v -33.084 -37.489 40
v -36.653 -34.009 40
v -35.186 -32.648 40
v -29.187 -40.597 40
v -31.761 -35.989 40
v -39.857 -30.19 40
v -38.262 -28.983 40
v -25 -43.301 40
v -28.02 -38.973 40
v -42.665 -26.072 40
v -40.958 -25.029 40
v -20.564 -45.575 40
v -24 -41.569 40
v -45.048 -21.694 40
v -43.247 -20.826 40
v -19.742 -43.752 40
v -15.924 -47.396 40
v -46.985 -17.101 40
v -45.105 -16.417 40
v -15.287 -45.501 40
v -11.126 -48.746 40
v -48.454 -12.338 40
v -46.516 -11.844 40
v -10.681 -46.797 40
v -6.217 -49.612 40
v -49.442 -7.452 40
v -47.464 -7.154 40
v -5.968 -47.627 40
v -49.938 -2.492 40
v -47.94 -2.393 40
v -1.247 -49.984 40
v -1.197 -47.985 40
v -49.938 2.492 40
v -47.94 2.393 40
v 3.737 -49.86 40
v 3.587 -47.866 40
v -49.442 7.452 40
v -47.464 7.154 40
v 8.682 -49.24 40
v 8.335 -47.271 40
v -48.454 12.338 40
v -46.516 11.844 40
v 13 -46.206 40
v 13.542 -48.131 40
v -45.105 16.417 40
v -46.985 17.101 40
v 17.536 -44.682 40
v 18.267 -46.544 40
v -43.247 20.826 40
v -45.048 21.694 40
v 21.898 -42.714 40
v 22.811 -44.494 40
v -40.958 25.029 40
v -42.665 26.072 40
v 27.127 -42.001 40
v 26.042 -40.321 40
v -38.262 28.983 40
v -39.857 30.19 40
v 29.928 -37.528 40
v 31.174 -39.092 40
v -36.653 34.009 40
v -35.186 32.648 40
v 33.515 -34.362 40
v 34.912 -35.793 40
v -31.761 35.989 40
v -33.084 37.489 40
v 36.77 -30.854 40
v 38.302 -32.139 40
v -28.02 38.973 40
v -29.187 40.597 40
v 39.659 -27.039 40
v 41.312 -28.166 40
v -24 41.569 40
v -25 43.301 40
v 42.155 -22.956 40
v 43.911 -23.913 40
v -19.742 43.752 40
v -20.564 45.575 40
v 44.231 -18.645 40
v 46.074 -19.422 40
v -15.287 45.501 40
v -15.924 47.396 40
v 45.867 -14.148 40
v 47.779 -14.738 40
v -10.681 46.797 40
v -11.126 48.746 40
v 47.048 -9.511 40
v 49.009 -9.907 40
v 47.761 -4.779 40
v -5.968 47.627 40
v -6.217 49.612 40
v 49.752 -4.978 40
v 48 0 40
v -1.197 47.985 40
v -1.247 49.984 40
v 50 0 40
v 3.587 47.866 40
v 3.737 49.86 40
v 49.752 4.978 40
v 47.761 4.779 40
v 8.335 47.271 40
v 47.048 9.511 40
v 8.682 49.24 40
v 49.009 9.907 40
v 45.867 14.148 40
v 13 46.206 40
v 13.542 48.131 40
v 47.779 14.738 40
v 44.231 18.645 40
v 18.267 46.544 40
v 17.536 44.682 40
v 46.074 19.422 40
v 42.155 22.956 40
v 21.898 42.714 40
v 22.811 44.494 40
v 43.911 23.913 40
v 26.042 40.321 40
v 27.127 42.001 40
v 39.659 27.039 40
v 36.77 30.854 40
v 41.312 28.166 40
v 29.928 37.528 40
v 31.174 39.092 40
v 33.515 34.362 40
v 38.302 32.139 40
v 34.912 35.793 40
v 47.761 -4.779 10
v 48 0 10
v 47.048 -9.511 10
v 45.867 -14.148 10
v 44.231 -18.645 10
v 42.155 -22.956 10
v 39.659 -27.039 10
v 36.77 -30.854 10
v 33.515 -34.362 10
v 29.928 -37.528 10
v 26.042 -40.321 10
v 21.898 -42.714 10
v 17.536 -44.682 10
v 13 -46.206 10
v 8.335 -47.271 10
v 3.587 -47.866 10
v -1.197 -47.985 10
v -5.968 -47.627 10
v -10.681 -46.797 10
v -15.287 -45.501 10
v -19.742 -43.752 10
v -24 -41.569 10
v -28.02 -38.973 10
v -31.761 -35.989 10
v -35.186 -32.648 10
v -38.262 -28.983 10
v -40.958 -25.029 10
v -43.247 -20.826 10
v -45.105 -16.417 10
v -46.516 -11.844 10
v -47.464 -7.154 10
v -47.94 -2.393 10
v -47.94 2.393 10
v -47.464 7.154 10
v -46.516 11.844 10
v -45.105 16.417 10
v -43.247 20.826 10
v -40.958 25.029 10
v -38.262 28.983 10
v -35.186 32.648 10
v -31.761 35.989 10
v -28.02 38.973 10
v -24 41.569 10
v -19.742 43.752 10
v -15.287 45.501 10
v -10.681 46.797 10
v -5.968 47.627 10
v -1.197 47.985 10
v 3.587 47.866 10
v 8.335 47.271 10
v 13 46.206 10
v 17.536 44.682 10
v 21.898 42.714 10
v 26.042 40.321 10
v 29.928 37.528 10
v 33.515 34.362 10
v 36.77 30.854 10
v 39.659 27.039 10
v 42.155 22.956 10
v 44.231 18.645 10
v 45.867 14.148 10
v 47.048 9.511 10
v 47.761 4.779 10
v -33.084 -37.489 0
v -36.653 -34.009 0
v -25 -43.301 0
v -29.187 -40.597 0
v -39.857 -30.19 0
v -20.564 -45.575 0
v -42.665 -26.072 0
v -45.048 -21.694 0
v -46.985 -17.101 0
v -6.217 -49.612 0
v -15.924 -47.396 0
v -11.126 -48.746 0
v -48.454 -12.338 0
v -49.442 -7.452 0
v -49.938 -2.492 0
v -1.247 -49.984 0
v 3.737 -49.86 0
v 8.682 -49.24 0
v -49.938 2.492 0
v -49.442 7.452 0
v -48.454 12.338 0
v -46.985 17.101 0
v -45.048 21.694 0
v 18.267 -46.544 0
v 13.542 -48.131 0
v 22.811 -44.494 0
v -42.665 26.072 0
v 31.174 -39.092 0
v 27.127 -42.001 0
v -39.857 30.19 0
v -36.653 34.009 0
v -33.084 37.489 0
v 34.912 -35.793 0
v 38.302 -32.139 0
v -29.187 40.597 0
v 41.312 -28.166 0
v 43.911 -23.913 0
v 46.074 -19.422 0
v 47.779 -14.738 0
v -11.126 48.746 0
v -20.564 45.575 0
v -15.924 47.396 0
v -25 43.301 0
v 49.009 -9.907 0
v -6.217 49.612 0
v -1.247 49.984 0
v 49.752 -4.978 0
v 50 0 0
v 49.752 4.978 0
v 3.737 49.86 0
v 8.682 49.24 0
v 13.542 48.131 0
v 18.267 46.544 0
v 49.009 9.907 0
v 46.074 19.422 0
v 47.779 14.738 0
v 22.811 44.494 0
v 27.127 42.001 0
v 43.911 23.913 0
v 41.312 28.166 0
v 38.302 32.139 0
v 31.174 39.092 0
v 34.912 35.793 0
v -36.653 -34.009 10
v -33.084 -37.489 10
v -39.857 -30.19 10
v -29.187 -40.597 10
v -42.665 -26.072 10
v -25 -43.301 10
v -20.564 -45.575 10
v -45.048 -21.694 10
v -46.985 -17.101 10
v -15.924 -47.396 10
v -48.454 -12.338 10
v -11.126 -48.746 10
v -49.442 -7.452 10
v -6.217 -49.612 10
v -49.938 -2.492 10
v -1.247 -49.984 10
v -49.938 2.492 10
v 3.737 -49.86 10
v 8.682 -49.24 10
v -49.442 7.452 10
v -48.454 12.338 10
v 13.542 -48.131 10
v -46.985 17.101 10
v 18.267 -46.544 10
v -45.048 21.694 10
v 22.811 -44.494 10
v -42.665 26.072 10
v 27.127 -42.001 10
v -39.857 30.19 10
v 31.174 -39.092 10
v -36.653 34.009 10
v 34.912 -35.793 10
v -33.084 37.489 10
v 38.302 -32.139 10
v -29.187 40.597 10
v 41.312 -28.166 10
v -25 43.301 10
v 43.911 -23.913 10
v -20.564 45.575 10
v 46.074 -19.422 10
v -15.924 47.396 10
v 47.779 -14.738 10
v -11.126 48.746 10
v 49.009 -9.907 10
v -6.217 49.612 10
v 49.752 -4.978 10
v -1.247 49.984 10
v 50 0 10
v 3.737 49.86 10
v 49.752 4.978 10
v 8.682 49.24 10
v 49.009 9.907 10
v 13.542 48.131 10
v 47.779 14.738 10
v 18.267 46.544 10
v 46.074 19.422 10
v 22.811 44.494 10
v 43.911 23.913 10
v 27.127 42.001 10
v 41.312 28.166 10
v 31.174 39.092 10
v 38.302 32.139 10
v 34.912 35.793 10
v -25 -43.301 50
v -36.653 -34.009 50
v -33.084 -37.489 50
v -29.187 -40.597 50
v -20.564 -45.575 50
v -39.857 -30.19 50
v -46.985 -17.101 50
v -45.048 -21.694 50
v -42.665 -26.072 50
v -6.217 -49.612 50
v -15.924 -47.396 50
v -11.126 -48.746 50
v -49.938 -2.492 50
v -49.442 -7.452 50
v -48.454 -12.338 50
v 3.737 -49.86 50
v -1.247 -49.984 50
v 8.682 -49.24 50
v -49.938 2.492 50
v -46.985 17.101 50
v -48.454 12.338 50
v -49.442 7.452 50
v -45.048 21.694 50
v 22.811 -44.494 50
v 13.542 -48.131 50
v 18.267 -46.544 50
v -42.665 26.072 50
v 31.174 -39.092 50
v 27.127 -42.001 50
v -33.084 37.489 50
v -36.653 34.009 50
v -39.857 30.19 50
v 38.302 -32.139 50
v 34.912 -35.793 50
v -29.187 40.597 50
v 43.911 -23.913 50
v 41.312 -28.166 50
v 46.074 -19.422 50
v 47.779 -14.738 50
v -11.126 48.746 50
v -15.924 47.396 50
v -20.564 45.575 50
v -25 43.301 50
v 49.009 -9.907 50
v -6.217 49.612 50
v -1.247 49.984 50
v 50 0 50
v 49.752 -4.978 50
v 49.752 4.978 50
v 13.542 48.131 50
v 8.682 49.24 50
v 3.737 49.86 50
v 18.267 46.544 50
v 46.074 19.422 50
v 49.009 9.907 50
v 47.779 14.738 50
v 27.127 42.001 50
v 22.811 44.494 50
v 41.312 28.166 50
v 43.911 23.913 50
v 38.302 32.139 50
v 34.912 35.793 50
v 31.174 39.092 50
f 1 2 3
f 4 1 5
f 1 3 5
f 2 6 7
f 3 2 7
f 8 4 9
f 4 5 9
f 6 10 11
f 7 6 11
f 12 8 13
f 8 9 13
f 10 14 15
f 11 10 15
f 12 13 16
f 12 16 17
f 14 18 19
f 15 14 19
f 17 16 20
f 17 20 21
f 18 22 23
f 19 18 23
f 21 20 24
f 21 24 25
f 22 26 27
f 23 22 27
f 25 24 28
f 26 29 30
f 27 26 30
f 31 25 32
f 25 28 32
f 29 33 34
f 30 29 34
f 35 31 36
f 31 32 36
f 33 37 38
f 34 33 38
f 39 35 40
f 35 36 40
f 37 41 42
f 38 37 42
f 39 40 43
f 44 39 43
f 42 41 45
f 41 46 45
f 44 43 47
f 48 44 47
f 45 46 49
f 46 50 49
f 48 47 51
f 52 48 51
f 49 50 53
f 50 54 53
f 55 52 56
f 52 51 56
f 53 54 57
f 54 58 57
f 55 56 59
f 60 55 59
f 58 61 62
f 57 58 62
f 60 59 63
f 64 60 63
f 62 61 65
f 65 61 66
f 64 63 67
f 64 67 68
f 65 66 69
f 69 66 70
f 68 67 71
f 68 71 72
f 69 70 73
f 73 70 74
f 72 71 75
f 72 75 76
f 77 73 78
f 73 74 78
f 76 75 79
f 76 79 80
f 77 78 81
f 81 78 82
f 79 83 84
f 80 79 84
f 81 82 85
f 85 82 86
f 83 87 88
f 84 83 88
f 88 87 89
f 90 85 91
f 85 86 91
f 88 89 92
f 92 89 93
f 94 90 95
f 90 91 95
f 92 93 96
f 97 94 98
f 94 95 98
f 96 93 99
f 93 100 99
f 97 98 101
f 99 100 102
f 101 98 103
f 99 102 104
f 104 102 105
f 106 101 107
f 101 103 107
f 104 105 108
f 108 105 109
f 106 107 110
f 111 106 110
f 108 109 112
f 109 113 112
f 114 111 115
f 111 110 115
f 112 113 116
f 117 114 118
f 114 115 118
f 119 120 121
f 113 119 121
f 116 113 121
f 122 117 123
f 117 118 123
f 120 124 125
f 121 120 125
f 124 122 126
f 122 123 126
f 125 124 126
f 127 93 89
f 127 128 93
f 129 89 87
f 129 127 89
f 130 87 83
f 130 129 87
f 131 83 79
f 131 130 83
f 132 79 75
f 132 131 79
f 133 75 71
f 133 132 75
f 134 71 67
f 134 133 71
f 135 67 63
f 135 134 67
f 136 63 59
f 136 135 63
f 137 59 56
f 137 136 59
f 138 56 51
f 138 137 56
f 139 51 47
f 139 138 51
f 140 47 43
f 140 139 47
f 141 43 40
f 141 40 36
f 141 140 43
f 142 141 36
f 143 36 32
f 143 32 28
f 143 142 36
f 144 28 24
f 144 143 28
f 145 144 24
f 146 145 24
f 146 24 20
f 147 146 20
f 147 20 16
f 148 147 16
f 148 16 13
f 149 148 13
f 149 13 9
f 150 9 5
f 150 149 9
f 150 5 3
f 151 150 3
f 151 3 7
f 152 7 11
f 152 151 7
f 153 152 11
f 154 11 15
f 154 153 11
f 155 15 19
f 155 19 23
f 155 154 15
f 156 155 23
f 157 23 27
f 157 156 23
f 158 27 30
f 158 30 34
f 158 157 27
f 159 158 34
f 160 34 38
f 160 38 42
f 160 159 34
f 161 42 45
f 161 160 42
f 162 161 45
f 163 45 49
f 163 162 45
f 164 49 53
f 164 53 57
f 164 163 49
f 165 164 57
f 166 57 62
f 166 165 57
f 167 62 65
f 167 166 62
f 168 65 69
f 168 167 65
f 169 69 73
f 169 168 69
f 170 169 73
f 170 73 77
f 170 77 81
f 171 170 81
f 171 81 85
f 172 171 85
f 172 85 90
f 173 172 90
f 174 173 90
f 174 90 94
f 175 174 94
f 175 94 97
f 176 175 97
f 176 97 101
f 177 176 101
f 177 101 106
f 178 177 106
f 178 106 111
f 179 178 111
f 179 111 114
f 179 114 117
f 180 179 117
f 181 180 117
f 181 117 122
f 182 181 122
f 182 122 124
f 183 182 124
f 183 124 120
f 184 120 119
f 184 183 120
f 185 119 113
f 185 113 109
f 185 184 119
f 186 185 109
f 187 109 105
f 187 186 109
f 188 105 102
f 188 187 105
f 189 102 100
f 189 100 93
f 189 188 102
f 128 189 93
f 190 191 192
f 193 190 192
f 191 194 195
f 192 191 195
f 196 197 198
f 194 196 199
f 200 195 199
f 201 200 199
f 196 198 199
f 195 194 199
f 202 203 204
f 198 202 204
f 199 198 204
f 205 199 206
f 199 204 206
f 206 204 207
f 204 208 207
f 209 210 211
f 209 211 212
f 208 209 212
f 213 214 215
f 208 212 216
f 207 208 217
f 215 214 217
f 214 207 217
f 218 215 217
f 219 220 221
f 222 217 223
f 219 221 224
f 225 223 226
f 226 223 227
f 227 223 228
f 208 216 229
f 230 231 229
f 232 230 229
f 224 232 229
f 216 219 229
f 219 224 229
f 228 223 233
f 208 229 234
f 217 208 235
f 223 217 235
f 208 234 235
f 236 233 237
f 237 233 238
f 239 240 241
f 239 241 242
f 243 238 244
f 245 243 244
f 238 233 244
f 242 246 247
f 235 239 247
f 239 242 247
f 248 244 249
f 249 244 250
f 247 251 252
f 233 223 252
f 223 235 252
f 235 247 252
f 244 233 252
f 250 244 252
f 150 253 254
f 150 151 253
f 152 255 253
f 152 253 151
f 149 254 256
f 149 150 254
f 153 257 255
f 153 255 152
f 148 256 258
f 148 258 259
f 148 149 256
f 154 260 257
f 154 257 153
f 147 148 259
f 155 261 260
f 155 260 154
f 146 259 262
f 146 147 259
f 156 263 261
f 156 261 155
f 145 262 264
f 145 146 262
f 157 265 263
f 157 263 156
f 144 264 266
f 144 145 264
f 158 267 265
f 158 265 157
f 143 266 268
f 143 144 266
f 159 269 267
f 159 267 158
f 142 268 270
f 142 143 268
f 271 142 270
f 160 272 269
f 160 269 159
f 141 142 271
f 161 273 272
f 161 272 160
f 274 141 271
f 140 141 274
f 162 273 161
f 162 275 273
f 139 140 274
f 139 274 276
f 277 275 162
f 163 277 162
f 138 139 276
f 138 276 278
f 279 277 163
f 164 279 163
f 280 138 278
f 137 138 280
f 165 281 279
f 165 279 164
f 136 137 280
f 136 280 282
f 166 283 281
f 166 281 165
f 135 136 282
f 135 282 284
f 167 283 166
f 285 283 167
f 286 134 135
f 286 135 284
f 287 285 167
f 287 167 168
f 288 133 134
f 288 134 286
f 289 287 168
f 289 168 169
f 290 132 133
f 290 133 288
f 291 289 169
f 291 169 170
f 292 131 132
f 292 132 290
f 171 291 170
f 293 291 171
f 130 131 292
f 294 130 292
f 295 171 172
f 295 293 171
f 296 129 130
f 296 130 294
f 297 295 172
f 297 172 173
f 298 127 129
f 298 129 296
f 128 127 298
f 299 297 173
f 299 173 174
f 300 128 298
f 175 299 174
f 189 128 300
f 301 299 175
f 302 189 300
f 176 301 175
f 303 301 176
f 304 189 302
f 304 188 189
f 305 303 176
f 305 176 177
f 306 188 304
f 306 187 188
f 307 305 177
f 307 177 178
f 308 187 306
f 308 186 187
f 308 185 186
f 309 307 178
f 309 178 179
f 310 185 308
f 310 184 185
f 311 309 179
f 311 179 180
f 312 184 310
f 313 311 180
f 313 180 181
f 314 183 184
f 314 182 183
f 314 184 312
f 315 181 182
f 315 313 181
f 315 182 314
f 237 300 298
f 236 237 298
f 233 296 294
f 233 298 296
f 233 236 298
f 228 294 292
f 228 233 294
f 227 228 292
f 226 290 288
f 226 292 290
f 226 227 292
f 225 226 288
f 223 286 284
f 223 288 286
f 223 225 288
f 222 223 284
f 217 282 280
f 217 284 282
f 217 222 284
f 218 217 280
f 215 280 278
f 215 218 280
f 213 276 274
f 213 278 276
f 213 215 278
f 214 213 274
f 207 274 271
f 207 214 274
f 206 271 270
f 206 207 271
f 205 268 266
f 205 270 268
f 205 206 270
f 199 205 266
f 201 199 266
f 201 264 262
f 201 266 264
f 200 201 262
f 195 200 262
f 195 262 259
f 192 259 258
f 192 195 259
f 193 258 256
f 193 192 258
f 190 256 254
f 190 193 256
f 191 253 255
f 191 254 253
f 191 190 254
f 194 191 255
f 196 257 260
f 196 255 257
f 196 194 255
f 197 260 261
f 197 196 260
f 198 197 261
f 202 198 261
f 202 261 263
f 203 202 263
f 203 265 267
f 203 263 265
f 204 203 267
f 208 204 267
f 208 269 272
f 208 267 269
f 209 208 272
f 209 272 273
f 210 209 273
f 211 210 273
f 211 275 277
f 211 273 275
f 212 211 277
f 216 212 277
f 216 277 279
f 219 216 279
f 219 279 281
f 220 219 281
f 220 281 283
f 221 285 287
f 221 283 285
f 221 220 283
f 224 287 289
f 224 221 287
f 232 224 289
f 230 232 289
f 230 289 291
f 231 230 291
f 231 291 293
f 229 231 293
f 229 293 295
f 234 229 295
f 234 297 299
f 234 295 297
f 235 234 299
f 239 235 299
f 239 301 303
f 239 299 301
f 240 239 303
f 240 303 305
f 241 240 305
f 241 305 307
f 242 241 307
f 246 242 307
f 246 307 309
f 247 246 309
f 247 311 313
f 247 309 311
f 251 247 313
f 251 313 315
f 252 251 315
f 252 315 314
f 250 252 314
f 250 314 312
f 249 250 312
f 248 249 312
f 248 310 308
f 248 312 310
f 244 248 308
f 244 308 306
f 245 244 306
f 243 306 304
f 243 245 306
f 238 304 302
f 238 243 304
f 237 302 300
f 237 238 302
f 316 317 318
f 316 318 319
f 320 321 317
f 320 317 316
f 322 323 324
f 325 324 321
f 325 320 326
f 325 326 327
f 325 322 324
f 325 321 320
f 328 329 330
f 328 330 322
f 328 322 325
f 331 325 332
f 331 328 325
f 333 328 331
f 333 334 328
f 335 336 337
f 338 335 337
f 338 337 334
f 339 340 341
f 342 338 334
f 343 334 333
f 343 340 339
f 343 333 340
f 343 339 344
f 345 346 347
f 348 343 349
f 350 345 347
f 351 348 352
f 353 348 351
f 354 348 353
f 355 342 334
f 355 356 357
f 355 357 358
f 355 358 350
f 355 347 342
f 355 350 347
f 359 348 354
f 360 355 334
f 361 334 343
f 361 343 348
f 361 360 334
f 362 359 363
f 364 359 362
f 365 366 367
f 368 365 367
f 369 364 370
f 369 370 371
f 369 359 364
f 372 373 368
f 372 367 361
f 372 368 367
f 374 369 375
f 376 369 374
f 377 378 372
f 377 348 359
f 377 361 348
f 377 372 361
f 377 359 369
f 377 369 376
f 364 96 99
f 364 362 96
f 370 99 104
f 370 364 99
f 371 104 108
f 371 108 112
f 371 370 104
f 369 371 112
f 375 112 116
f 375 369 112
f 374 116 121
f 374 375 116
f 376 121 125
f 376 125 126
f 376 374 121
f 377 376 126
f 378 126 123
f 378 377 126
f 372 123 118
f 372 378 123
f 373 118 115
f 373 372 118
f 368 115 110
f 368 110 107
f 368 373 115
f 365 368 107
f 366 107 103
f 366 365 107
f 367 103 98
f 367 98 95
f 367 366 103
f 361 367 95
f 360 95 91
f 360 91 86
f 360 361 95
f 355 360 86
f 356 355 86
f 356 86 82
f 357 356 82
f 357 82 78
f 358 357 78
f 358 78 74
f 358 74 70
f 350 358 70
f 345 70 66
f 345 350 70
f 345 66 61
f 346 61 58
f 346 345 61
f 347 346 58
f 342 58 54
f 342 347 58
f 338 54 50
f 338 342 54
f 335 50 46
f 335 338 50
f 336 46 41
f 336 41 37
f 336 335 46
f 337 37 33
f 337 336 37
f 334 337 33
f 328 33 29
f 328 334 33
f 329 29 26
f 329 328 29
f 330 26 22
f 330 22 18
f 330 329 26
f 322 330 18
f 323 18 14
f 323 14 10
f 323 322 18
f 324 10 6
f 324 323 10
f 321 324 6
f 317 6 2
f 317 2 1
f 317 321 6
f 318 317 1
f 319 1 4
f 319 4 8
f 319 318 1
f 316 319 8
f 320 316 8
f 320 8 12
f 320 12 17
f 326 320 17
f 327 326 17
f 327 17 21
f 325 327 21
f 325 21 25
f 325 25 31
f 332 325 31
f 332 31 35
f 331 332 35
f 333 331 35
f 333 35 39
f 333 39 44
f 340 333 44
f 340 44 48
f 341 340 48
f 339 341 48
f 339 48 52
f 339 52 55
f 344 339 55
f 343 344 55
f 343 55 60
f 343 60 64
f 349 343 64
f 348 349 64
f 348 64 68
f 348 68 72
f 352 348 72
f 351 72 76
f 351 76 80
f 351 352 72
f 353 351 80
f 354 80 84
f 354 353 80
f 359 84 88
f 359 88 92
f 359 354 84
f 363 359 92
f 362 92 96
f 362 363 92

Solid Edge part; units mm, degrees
sketch "Sketch1" plane through (0, 0, 0) normal (0, 0, 1) x (1, 0, 0)
  circle A0 centre (0, 0) radius 48
extrude "Protrusion1" add sketch "Sketch1" along normal blind 50
sketch "Sketch2" plane through (0, 0, 0) normal (0, 0, 1) x (1, 0, 0)
  circle A0 centre (0, 0) radius 50
  circle A1 centre (0, 0) radius 48
  dimension "D1" = 100
  dimension "D2" = 96
extrude "ExtrudedProtrusion_2" add sketch "Sketch2" along normal blind 10
sketch "Sketch3" plane through (0, 0, 50) normal (0, 0, 1) x (1, 0, 0)
  circle A0 centre (0, 0) radius 50
extrude "ExtrudedProtrusion_4" add sketch "Sketch3" against normal blind 10
properties material "Aluminum, 1060"
